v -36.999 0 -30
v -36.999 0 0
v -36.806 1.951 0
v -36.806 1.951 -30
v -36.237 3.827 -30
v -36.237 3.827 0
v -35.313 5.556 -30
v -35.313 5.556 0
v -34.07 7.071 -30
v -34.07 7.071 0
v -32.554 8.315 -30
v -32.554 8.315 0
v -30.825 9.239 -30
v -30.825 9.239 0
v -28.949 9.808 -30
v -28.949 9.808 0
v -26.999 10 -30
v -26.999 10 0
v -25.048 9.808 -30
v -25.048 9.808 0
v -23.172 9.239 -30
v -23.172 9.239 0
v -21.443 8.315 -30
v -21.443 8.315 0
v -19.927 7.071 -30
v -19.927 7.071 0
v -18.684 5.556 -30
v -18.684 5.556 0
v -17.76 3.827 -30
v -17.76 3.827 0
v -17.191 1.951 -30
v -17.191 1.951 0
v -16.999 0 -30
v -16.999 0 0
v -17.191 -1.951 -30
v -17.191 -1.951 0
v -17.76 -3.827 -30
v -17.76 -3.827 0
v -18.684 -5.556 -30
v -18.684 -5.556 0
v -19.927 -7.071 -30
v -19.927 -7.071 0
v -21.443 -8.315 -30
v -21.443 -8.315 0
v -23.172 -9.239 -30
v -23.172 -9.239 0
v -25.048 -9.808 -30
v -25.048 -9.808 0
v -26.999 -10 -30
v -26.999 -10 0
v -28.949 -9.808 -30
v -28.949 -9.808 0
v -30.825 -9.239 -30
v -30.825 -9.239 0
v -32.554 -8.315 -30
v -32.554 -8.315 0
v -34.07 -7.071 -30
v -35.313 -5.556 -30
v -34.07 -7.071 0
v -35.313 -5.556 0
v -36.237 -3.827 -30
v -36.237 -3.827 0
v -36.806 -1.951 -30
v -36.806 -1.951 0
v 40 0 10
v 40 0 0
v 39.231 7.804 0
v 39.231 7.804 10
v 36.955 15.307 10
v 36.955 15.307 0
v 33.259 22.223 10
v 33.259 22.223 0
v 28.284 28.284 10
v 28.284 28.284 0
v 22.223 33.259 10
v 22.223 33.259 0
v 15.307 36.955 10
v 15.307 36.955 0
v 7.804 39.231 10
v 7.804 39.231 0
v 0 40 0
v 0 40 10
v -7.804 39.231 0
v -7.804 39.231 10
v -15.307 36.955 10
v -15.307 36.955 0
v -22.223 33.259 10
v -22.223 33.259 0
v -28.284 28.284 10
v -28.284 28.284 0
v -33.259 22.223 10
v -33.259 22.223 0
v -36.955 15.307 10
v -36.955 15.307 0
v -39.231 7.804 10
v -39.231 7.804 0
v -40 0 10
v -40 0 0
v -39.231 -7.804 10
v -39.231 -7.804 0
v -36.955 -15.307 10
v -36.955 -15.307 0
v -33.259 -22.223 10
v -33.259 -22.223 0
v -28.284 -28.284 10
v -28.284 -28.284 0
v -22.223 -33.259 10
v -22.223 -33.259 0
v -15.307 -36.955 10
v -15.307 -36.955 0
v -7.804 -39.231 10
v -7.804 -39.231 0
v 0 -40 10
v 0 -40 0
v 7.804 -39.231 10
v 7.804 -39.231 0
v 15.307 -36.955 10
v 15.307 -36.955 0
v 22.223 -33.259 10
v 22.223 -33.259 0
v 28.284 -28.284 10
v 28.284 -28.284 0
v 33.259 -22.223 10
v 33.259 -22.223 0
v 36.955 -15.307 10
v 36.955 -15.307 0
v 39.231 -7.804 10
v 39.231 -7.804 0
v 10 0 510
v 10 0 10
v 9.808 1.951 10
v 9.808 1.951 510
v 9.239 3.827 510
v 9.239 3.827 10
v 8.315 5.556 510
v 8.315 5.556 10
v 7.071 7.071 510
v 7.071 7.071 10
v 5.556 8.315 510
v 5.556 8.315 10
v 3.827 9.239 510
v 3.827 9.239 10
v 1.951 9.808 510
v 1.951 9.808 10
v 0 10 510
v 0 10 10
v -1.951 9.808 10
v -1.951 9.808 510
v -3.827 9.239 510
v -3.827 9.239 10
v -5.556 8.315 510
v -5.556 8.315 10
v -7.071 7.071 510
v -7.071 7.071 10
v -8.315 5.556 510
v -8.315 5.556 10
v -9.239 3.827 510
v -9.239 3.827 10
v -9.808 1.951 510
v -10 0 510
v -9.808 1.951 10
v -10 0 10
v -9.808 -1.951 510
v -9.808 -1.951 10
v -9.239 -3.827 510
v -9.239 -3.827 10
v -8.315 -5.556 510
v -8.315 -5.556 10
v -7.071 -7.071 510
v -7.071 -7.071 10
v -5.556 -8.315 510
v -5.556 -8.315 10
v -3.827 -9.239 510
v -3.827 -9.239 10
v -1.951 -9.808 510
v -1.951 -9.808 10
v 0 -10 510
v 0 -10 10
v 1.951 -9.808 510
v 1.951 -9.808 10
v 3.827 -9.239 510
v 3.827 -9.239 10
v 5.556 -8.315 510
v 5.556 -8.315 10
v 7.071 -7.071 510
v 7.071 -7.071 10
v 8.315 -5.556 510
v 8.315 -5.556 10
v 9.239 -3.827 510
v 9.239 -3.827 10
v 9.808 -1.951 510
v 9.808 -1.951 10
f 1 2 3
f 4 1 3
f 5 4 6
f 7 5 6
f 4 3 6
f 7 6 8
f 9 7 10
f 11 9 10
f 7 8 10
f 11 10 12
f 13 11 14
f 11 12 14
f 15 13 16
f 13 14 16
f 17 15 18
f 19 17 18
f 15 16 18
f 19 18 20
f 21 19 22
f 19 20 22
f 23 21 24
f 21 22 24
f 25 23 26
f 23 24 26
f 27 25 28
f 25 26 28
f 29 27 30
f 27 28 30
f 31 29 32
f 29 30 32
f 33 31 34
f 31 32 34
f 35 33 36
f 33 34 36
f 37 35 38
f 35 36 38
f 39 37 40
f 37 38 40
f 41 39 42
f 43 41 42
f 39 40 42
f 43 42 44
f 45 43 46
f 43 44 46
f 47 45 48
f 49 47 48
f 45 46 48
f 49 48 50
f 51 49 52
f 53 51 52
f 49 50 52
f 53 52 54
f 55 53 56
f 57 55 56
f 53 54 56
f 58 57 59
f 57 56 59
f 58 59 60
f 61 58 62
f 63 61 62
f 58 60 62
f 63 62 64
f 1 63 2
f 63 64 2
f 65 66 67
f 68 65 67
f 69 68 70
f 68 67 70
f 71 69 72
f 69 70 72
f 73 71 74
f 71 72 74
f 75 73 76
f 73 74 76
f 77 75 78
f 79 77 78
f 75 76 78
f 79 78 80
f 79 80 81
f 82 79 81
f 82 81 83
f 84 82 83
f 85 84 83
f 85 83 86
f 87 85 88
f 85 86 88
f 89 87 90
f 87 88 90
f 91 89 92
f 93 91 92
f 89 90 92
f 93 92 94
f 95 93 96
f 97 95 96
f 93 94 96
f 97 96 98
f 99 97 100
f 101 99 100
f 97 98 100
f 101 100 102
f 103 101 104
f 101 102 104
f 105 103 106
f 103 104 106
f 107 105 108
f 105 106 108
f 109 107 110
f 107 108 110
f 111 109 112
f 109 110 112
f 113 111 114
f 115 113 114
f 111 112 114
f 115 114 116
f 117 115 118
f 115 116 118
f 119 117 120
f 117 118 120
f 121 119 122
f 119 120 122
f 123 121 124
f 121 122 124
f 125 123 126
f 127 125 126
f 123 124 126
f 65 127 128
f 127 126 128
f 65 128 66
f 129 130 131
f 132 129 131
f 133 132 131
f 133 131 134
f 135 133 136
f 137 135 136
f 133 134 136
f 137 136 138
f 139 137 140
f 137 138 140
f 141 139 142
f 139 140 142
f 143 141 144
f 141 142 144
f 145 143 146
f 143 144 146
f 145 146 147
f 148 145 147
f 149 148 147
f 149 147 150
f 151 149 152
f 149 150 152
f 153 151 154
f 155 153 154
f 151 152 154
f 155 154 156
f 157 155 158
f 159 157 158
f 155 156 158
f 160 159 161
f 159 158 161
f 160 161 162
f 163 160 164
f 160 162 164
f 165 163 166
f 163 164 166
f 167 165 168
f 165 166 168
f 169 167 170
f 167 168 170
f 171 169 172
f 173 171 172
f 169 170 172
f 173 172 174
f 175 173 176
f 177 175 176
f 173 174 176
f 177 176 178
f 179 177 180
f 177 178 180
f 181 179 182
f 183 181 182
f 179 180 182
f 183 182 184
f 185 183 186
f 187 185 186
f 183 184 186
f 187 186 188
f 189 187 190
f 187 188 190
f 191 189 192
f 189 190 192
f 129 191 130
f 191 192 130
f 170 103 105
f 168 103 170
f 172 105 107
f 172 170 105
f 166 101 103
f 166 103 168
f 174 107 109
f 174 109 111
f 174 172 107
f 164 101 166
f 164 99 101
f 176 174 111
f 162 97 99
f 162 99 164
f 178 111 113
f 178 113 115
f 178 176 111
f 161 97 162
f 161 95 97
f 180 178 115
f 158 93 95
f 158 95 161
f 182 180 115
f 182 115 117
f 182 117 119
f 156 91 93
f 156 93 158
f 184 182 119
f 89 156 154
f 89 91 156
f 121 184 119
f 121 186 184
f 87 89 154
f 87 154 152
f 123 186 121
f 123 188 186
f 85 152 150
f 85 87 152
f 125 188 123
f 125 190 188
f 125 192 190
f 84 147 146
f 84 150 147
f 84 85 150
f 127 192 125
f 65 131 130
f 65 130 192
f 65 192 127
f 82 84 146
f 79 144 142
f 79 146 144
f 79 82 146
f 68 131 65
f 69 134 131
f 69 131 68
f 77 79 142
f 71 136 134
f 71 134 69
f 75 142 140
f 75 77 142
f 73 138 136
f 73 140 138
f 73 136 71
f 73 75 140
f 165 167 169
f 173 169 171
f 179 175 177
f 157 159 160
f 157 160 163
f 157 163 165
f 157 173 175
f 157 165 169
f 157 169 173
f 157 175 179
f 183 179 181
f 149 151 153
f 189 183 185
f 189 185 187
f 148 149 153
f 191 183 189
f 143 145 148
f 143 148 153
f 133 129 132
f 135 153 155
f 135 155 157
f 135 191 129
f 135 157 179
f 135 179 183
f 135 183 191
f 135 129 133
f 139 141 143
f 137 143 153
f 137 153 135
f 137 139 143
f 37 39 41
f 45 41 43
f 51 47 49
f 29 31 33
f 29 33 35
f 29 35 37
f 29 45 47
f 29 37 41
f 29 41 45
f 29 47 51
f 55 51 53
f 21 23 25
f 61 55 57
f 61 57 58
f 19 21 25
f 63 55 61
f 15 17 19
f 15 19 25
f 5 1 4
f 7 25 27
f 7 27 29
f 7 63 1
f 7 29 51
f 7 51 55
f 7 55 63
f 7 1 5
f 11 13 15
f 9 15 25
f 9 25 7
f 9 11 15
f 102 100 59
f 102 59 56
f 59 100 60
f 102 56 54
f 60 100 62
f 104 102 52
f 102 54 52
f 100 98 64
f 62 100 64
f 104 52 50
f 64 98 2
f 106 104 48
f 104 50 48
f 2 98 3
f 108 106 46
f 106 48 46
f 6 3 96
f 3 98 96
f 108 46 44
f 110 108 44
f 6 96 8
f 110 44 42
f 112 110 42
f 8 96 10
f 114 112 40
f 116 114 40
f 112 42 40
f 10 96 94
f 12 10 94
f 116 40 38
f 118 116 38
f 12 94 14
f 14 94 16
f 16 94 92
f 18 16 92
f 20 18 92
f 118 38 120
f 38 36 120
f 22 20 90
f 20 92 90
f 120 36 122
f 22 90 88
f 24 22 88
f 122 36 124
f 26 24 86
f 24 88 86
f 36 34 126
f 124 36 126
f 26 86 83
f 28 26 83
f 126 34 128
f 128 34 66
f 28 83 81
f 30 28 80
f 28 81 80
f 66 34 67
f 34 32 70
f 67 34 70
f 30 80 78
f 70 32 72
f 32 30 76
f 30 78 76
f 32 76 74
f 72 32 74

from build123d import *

# Parameters (mm, degrees)
SKETCH1_R           = 40
BOSS_EXTRUDE1_DEPTH = 10
SKETCH2_R           = 10
BOSS_EXTRUDE2_DEPTH = 500
SKETCH3_R           = 10
BOSS_EXTRUDE3_DEPTH = 30


with BuildPart() as part:
    # Sketch1 → Boss-Extrude1 (new body)
    with BuildSketch(Plane.XY):
        Circle(SKETCH1_R)
    extrude(amount=BOSS_EXTRUDE1_DEPTH)

    # Sketch2 → Boss-Extrude2 (add)
    with BuildSketch(Plane.XY.offset(10)):
        Circle(SKETCH2_R)
    extrude(amount=BOSS_EXTRUDE2_DEPTH)

    # Sketch3 → Boss-Extrude3 (add)
    with BuildSketch(Plane(origin=(0, 0, 0), x_dir=(-1, 0, 0), z_dir=(0, 0, -1))):
        with Locations((26.998561916, 0)):
            Circle(SKETCH3_R)
    extrude(amount=BOSS_EXTRUDE3_DEPTH)


solid = part.part
